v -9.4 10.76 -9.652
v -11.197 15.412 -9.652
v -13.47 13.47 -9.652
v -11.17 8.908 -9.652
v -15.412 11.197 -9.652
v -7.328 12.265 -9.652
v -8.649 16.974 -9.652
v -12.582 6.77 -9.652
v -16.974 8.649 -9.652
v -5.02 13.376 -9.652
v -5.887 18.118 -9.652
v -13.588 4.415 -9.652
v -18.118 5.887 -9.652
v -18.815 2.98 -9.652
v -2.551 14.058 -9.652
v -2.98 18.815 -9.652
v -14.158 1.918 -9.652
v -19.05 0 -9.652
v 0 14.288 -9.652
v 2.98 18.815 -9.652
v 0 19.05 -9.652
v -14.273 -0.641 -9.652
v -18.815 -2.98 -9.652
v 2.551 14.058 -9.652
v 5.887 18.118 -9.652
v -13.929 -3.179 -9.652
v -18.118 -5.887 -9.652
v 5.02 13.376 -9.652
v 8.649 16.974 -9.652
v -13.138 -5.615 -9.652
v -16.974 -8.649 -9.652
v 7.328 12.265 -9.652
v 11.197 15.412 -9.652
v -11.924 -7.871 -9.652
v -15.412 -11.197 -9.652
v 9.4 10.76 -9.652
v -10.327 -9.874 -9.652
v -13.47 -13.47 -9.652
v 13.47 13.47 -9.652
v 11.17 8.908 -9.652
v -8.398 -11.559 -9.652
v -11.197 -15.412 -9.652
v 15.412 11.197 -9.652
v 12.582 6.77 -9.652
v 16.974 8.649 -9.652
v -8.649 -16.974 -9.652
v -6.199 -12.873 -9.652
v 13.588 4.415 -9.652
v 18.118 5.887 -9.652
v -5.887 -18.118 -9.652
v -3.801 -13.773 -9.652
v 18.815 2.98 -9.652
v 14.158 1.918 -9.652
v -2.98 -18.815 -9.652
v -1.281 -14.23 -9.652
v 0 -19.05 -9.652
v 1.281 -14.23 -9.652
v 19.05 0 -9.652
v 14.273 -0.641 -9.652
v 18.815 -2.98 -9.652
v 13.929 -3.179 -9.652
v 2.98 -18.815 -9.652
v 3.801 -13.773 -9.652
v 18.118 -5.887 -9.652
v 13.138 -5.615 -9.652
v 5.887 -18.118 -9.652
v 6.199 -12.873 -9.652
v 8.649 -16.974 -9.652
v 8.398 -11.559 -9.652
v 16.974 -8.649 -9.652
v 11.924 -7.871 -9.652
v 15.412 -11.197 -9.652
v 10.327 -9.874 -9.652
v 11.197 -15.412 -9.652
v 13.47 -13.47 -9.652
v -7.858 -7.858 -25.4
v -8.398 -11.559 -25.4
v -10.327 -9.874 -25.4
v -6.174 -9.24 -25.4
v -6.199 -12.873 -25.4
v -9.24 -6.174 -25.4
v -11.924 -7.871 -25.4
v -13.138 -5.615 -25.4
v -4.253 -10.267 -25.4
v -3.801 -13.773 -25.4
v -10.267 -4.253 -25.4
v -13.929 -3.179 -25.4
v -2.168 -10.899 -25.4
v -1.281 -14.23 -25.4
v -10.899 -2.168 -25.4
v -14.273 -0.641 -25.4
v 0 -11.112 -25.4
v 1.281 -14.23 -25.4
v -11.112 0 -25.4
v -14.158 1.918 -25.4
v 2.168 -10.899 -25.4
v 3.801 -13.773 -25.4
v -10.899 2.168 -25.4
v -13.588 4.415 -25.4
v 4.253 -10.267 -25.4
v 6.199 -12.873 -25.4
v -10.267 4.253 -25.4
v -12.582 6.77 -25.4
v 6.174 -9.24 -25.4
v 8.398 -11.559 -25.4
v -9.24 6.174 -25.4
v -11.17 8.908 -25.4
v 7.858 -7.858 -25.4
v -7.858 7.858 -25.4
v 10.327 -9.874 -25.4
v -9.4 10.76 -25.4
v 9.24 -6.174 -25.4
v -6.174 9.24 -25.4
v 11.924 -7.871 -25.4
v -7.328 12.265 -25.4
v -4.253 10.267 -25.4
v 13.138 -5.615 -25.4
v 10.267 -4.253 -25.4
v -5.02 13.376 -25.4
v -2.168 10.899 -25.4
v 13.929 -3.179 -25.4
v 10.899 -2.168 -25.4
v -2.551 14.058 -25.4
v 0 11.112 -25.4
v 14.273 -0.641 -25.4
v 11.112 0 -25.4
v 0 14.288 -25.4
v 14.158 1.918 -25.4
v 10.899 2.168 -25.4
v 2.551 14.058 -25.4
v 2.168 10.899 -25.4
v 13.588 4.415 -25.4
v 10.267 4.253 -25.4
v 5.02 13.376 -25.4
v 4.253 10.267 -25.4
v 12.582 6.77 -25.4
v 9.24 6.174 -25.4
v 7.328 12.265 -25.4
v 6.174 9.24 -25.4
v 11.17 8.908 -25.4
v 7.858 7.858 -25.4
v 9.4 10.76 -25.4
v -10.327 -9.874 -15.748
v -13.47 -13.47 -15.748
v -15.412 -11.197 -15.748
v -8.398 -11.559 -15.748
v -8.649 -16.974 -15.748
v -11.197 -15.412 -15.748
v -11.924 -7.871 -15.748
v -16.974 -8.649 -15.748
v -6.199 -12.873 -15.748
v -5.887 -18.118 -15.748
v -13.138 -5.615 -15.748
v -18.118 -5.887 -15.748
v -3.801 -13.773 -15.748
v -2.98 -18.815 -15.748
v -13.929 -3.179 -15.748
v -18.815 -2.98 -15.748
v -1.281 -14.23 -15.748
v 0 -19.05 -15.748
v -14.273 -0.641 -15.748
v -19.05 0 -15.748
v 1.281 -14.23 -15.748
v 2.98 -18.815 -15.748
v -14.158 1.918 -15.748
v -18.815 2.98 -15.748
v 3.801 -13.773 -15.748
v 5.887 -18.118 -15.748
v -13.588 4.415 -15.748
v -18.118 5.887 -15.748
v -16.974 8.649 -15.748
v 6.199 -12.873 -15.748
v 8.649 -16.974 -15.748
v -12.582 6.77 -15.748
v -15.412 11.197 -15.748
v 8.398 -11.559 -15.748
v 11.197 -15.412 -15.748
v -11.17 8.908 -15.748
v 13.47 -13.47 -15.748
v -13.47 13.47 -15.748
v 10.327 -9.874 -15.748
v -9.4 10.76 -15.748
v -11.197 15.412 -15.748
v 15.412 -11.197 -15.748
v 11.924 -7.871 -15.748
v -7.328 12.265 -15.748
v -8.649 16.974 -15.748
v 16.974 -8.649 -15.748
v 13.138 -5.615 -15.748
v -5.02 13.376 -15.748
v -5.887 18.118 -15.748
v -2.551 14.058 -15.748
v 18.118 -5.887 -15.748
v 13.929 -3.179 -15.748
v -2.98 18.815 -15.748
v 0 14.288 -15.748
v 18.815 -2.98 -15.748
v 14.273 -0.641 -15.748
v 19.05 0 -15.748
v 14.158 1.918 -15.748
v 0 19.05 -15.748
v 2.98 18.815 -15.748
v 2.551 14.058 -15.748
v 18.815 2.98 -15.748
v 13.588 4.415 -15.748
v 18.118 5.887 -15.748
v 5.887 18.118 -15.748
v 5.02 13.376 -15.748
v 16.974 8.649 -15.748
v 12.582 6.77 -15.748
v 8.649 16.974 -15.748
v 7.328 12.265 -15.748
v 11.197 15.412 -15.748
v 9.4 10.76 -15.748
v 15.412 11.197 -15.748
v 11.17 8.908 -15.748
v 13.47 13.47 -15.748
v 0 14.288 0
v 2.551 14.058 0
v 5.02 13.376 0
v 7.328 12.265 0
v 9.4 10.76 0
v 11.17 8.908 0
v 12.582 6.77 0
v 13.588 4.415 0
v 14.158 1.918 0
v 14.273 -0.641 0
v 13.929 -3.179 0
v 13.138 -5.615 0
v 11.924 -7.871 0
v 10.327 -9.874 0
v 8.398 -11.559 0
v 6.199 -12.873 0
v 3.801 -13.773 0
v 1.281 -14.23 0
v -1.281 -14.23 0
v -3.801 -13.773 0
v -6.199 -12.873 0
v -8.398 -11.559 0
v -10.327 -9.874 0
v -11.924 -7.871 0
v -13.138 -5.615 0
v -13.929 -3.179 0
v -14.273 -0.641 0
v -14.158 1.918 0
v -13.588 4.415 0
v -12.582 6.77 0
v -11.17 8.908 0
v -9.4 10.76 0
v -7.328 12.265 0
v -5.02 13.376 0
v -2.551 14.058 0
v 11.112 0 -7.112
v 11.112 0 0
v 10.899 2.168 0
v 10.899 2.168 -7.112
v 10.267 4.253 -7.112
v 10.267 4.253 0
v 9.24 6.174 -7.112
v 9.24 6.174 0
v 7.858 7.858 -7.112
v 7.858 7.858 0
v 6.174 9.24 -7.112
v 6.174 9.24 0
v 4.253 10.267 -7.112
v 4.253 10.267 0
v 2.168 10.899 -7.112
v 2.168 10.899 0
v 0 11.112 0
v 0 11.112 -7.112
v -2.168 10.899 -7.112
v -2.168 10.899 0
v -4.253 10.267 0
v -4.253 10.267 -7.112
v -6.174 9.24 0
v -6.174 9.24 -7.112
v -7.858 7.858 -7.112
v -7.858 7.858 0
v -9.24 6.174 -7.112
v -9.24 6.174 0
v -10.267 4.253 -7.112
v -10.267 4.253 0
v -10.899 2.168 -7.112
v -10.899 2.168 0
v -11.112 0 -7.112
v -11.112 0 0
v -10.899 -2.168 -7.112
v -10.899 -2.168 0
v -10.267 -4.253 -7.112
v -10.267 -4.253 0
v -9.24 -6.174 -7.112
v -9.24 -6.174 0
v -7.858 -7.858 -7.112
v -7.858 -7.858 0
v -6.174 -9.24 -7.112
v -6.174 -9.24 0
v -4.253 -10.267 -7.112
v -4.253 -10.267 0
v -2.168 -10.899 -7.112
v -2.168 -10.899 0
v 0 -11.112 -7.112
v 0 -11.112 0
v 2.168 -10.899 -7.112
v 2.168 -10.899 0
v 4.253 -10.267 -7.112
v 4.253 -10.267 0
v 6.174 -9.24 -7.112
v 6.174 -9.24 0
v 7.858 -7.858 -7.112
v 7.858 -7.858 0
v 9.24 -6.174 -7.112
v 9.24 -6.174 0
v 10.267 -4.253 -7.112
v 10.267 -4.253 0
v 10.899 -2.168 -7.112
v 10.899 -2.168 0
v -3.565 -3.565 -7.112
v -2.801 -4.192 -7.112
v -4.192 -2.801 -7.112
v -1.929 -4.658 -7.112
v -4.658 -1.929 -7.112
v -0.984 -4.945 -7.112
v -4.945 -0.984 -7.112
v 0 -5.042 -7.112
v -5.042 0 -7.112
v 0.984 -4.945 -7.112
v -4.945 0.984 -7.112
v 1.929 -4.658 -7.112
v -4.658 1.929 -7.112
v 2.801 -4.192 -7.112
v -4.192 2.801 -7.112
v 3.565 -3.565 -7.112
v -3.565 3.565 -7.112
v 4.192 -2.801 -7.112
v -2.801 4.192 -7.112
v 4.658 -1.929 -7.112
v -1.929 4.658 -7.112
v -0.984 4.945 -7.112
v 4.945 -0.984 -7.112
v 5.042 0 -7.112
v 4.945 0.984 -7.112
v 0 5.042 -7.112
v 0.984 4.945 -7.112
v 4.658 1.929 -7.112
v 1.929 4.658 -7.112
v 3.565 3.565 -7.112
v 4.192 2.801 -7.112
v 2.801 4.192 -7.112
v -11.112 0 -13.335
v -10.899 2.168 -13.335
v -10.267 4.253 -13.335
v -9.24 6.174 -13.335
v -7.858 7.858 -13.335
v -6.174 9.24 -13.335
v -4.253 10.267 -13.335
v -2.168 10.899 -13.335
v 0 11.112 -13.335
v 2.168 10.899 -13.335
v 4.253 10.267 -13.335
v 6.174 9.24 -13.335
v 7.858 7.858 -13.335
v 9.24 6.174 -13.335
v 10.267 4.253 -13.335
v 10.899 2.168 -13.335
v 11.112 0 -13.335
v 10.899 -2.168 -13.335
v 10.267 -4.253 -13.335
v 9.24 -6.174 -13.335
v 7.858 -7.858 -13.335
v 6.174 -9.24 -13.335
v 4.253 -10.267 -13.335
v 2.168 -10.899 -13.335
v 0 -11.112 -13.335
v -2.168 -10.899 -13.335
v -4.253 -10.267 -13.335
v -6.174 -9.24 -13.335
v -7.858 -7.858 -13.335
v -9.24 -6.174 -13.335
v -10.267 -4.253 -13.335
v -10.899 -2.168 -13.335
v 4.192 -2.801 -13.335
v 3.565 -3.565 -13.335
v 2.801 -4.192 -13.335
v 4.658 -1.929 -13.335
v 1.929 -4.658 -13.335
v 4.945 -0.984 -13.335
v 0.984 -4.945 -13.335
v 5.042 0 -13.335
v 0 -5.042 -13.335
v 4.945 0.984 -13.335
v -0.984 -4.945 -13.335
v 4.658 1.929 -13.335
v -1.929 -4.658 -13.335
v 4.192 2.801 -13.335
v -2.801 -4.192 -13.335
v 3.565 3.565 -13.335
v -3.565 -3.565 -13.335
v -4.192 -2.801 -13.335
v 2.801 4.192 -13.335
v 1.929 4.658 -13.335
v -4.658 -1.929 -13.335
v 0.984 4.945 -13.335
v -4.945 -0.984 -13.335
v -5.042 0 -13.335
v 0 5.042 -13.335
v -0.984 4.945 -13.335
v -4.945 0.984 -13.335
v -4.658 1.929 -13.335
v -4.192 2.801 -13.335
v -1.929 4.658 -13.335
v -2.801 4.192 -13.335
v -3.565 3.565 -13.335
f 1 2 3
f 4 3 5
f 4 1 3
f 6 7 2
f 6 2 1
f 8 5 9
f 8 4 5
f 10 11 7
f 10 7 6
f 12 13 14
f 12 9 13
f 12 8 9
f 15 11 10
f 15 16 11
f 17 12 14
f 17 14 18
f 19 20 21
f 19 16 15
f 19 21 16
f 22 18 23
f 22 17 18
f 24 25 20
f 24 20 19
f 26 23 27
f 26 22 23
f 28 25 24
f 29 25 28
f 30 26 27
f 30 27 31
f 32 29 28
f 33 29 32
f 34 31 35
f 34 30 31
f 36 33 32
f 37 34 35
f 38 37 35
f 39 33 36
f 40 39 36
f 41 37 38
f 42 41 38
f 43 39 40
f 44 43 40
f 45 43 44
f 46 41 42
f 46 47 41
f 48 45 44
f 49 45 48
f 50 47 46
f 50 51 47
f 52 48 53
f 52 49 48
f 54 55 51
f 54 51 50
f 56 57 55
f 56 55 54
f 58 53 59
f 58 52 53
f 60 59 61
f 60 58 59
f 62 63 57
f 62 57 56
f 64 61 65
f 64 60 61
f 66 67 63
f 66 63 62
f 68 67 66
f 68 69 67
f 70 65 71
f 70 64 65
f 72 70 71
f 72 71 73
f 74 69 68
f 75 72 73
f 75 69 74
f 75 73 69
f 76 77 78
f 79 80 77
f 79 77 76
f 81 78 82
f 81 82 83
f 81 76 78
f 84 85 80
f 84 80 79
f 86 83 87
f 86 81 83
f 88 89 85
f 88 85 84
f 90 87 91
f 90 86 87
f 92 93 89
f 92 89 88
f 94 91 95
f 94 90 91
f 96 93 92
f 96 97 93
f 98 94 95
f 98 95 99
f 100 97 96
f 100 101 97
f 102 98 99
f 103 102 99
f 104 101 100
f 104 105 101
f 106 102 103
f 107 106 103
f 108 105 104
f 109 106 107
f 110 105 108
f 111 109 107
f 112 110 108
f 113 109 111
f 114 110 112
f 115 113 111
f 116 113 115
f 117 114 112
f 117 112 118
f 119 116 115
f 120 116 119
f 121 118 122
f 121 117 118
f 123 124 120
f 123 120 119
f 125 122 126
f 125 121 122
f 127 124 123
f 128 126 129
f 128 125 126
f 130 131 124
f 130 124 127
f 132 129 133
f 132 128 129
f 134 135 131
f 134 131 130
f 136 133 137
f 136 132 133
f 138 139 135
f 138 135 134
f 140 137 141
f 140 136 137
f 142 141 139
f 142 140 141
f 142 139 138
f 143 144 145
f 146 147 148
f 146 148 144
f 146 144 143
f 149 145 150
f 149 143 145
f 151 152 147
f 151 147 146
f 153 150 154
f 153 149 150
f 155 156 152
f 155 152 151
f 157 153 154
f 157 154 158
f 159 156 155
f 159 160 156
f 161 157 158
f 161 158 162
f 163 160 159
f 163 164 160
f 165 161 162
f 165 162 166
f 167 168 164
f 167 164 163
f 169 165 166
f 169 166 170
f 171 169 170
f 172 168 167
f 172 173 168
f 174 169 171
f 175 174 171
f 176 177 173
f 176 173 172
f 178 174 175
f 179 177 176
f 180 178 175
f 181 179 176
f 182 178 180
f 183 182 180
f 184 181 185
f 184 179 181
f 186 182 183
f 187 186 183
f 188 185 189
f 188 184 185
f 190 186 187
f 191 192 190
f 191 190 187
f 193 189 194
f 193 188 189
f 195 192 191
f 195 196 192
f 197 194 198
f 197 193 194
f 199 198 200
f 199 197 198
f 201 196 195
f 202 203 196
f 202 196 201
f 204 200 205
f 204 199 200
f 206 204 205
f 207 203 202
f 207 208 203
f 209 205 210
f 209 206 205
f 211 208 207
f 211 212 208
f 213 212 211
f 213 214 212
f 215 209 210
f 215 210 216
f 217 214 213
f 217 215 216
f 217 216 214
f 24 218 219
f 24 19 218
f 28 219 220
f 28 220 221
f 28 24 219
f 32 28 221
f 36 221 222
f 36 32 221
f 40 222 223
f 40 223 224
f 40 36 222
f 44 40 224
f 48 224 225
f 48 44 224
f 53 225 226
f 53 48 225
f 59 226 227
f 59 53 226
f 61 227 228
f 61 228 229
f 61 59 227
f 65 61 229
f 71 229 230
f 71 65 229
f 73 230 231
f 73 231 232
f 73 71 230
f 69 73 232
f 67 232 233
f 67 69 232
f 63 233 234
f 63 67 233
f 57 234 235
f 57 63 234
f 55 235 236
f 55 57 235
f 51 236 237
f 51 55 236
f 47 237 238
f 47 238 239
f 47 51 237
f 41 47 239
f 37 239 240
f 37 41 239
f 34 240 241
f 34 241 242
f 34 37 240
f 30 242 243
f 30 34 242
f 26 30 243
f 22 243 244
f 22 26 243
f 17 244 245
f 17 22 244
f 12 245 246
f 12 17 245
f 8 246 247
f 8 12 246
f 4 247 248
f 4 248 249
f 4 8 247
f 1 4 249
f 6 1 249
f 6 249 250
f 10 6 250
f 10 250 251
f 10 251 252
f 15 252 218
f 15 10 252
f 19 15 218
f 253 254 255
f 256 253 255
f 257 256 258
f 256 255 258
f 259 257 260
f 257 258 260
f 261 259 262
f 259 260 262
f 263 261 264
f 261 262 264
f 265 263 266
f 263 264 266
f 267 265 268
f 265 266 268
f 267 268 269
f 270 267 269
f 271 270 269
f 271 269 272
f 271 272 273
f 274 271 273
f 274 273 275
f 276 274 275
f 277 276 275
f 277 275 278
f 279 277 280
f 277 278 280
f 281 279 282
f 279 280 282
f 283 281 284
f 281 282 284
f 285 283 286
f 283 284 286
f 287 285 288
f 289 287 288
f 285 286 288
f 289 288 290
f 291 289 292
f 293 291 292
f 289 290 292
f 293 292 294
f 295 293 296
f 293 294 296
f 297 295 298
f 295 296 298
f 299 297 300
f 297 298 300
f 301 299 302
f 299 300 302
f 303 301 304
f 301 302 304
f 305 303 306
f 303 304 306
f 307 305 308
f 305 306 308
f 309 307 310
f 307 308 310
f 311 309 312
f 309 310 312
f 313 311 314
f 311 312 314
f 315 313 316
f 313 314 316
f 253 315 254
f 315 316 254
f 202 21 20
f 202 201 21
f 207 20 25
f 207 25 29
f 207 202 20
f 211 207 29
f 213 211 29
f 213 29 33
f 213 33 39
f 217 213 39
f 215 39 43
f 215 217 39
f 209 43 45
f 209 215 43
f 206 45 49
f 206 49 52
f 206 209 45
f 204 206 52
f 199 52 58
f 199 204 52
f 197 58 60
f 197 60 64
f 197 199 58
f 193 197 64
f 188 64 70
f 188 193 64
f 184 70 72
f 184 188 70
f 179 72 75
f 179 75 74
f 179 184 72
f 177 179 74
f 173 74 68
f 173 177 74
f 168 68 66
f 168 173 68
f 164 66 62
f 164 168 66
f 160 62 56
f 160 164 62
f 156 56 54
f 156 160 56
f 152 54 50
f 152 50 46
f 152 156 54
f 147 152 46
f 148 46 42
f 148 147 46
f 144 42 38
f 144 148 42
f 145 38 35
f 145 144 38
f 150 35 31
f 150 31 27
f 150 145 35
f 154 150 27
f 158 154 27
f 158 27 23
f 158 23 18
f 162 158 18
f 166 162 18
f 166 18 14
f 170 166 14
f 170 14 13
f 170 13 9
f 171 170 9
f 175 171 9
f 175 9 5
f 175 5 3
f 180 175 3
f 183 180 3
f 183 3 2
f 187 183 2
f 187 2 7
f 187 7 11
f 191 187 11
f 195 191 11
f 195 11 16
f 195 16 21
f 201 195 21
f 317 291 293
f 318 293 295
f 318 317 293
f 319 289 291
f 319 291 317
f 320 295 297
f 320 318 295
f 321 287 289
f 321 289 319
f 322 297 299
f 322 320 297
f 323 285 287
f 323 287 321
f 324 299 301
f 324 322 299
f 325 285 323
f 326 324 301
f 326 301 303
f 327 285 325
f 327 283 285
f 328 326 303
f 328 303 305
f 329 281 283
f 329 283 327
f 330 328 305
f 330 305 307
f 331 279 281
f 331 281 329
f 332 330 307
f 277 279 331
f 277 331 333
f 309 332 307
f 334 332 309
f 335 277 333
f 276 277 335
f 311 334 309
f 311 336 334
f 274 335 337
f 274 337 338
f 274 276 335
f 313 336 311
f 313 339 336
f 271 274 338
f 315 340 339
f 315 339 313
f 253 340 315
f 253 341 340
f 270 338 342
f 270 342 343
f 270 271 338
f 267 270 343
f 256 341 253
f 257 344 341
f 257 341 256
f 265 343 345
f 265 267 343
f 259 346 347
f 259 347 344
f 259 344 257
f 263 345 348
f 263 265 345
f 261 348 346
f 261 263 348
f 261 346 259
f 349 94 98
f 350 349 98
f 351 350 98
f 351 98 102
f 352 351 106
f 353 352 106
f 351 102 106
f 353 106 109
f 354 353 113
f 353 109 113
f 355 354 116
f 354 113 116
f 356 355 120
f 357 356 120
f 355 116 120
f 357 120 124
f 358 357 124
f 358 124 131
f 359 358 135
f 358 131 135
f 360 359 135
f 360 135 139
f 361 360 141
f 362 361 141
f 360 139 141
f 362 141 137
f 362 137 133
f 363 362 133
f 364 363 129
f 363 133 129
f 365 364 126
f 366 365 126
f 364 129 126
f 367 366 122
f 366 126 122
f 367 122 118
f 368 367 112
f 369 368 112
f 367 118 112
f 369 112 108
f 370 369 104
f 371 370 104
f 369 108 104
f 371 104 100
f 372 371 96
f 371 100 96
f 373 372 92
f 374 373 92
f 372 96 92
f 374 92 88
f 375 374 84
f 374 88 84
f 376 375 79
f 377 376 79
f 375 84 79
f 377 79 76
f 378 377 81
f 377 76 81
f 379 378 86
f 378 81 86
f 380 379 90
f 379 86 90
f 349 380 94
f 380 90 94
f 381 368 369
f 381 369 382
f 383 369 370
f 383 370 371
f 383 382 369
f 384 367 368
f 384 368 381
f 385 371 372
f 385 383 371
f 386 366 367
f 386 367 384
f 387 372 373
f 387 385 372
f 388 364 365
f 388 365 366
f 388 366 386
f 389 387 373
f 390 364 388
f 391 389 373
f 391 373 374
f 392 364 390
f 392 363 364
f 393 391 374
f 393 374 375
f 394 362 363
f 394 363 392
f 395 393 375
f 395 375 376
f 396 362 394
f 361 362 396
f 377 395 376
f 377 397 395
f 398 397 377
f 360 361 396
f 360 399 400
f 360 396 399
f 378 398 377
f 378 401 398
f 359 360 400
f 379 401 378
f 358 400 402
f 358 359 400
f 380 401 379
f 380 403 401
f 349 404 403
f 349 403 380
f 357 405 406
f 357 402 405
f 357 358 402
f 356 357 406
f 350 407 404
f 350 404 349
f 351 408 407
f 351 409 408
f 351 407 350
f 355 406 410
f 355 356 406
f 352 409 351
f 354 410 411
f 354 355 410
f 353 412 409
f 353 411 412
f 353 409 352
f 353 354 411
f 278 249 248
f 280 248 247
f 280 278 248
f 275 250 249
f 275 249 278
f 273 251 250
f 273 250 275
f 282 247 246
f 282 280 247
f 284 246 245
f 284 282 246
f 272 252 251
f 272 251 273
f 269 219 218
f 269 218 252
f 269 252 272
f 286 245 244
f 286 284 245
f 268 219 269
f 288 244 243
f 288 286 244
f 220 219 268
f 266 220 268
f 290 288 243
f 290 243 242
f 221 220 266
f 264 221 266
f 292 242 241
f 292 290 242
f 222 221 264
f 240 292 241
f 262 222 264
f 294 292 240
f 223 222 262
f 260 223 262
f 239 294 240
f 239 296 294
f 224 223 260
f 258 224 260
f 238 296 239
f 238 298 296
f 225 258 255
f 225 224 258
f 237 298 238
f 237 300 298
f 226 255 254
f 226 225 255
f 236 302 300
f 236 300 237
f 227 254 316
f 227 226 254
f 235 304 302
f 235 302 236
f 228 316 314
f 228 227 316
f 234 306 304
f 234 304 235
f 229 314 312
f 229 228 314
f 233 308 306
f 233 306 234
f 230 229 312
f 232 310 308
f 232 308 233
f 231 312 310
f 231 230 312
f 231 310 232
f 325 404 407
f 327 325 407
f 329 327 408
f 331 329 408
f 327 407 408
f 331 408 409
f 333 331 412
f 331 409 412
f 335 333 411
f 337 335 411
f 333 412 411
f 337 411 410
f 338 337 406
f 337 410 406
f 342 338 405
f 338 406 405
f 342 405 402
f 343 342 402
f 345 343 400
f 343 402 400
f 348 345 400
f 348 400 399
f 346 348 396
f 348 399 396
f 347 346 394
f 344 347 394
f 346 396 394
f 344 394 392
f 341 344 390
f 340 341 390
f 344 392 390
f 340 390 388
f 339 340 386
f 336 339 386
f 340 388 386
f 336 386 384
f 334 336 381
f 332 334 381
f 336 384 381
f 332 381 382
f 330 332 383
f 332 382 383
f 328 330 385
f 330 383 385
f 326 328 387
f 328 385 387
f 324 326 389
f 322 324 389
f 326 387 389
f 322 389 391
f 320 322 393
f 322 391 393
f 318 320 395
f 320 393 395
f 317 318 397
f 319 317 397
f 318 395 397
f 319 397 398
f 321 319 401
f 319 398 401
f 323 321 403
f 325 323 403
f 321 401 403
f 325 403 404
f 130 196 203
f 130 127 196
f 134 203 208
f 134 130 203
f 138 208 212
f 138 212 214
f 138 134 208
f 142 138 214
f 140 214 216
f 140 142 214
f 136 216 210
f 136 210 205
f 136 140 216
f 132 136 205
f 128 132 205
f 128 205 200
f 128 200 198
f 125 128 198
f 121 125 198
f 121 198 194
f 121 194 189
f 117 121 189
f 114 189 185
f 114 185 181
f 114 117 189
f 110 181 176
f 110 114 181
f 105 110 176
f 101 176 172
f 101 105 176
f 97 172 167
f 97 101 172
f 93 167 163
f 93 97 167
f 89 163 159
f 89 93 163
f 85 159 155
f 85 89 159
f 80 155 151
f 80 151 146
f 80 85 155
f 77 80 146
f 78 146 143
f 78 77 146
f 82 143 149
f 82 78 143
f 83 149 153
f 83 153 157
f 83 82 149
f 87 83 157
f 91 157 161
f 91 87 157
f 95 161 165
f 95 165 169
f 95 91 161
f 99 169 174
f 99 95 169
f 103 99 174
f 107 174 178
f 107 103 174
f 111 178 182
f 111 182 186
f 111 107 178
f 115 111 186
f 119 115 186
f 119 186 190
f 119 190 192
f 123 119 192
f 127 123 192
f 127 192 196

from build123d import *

# Parameters (mm, degrees)
F_3_8_CLEARANCE_HOLE1_D     = 10.0838
F_3_8_CLEARANCE_HOLE1_DEPTH = 25.4
SKETCH6_R                   = 11.1125
CUT_EXTRUDE1_DEPTH          = 7.112
SKETCH7_R                   = 11.1125
CUT_EXTRUDE2_DEPTH          = 12.065


with BuildPart() as part:
    # Sketch1 → Revolve1 (revolve)
    with BuildSketch(Plane(origin=(0, 0, 0), x_dir=(0, 0, -1), z_dir=(1, 0, 0))):
        Polygon((0, 0), (0, 14.2875), (9.652, 14.2875), (9.652, 19.05), (15.748, 19.05), (15.748, 14.2875), (25.4, 14.2875), (25.4, 0), align=None)
    revolve(axis=Axis((0, 0, 13.696708861), (0, 0, -1)))

    # 3/8 Clearance Hole1
    with Locations(Plane.XY):
        with Locations((0, 0)):
            Hole(F_3_8_CLEARANCE_HOLE1_D / 2, depth=F_3_8_CLEARANCE_HOLE1_DEPTH)

    # Sketch6 → Cut-Extrude1 (cut)
    with BuildSketch(Plane.XY):
        Circle(SKETCH6_R)
    extrude(amount=-CUT_EXTRUDE1_DEPTH, mode=Mode.SUBTRACT)

    # Sketch7 → Cut-Extrude2 (cut)
    with BuildSketch(Plane(origin=(0, 0, -25.4), x_dir=(-1, 0, 0), z_dir=(0, 0, -1))):
        Circle(SKETCH7_R)
    extrude(amount=-CUT_EXTRUDE2_DEPTH, mode=Mode.SUBTRACT)


solid = part.part
